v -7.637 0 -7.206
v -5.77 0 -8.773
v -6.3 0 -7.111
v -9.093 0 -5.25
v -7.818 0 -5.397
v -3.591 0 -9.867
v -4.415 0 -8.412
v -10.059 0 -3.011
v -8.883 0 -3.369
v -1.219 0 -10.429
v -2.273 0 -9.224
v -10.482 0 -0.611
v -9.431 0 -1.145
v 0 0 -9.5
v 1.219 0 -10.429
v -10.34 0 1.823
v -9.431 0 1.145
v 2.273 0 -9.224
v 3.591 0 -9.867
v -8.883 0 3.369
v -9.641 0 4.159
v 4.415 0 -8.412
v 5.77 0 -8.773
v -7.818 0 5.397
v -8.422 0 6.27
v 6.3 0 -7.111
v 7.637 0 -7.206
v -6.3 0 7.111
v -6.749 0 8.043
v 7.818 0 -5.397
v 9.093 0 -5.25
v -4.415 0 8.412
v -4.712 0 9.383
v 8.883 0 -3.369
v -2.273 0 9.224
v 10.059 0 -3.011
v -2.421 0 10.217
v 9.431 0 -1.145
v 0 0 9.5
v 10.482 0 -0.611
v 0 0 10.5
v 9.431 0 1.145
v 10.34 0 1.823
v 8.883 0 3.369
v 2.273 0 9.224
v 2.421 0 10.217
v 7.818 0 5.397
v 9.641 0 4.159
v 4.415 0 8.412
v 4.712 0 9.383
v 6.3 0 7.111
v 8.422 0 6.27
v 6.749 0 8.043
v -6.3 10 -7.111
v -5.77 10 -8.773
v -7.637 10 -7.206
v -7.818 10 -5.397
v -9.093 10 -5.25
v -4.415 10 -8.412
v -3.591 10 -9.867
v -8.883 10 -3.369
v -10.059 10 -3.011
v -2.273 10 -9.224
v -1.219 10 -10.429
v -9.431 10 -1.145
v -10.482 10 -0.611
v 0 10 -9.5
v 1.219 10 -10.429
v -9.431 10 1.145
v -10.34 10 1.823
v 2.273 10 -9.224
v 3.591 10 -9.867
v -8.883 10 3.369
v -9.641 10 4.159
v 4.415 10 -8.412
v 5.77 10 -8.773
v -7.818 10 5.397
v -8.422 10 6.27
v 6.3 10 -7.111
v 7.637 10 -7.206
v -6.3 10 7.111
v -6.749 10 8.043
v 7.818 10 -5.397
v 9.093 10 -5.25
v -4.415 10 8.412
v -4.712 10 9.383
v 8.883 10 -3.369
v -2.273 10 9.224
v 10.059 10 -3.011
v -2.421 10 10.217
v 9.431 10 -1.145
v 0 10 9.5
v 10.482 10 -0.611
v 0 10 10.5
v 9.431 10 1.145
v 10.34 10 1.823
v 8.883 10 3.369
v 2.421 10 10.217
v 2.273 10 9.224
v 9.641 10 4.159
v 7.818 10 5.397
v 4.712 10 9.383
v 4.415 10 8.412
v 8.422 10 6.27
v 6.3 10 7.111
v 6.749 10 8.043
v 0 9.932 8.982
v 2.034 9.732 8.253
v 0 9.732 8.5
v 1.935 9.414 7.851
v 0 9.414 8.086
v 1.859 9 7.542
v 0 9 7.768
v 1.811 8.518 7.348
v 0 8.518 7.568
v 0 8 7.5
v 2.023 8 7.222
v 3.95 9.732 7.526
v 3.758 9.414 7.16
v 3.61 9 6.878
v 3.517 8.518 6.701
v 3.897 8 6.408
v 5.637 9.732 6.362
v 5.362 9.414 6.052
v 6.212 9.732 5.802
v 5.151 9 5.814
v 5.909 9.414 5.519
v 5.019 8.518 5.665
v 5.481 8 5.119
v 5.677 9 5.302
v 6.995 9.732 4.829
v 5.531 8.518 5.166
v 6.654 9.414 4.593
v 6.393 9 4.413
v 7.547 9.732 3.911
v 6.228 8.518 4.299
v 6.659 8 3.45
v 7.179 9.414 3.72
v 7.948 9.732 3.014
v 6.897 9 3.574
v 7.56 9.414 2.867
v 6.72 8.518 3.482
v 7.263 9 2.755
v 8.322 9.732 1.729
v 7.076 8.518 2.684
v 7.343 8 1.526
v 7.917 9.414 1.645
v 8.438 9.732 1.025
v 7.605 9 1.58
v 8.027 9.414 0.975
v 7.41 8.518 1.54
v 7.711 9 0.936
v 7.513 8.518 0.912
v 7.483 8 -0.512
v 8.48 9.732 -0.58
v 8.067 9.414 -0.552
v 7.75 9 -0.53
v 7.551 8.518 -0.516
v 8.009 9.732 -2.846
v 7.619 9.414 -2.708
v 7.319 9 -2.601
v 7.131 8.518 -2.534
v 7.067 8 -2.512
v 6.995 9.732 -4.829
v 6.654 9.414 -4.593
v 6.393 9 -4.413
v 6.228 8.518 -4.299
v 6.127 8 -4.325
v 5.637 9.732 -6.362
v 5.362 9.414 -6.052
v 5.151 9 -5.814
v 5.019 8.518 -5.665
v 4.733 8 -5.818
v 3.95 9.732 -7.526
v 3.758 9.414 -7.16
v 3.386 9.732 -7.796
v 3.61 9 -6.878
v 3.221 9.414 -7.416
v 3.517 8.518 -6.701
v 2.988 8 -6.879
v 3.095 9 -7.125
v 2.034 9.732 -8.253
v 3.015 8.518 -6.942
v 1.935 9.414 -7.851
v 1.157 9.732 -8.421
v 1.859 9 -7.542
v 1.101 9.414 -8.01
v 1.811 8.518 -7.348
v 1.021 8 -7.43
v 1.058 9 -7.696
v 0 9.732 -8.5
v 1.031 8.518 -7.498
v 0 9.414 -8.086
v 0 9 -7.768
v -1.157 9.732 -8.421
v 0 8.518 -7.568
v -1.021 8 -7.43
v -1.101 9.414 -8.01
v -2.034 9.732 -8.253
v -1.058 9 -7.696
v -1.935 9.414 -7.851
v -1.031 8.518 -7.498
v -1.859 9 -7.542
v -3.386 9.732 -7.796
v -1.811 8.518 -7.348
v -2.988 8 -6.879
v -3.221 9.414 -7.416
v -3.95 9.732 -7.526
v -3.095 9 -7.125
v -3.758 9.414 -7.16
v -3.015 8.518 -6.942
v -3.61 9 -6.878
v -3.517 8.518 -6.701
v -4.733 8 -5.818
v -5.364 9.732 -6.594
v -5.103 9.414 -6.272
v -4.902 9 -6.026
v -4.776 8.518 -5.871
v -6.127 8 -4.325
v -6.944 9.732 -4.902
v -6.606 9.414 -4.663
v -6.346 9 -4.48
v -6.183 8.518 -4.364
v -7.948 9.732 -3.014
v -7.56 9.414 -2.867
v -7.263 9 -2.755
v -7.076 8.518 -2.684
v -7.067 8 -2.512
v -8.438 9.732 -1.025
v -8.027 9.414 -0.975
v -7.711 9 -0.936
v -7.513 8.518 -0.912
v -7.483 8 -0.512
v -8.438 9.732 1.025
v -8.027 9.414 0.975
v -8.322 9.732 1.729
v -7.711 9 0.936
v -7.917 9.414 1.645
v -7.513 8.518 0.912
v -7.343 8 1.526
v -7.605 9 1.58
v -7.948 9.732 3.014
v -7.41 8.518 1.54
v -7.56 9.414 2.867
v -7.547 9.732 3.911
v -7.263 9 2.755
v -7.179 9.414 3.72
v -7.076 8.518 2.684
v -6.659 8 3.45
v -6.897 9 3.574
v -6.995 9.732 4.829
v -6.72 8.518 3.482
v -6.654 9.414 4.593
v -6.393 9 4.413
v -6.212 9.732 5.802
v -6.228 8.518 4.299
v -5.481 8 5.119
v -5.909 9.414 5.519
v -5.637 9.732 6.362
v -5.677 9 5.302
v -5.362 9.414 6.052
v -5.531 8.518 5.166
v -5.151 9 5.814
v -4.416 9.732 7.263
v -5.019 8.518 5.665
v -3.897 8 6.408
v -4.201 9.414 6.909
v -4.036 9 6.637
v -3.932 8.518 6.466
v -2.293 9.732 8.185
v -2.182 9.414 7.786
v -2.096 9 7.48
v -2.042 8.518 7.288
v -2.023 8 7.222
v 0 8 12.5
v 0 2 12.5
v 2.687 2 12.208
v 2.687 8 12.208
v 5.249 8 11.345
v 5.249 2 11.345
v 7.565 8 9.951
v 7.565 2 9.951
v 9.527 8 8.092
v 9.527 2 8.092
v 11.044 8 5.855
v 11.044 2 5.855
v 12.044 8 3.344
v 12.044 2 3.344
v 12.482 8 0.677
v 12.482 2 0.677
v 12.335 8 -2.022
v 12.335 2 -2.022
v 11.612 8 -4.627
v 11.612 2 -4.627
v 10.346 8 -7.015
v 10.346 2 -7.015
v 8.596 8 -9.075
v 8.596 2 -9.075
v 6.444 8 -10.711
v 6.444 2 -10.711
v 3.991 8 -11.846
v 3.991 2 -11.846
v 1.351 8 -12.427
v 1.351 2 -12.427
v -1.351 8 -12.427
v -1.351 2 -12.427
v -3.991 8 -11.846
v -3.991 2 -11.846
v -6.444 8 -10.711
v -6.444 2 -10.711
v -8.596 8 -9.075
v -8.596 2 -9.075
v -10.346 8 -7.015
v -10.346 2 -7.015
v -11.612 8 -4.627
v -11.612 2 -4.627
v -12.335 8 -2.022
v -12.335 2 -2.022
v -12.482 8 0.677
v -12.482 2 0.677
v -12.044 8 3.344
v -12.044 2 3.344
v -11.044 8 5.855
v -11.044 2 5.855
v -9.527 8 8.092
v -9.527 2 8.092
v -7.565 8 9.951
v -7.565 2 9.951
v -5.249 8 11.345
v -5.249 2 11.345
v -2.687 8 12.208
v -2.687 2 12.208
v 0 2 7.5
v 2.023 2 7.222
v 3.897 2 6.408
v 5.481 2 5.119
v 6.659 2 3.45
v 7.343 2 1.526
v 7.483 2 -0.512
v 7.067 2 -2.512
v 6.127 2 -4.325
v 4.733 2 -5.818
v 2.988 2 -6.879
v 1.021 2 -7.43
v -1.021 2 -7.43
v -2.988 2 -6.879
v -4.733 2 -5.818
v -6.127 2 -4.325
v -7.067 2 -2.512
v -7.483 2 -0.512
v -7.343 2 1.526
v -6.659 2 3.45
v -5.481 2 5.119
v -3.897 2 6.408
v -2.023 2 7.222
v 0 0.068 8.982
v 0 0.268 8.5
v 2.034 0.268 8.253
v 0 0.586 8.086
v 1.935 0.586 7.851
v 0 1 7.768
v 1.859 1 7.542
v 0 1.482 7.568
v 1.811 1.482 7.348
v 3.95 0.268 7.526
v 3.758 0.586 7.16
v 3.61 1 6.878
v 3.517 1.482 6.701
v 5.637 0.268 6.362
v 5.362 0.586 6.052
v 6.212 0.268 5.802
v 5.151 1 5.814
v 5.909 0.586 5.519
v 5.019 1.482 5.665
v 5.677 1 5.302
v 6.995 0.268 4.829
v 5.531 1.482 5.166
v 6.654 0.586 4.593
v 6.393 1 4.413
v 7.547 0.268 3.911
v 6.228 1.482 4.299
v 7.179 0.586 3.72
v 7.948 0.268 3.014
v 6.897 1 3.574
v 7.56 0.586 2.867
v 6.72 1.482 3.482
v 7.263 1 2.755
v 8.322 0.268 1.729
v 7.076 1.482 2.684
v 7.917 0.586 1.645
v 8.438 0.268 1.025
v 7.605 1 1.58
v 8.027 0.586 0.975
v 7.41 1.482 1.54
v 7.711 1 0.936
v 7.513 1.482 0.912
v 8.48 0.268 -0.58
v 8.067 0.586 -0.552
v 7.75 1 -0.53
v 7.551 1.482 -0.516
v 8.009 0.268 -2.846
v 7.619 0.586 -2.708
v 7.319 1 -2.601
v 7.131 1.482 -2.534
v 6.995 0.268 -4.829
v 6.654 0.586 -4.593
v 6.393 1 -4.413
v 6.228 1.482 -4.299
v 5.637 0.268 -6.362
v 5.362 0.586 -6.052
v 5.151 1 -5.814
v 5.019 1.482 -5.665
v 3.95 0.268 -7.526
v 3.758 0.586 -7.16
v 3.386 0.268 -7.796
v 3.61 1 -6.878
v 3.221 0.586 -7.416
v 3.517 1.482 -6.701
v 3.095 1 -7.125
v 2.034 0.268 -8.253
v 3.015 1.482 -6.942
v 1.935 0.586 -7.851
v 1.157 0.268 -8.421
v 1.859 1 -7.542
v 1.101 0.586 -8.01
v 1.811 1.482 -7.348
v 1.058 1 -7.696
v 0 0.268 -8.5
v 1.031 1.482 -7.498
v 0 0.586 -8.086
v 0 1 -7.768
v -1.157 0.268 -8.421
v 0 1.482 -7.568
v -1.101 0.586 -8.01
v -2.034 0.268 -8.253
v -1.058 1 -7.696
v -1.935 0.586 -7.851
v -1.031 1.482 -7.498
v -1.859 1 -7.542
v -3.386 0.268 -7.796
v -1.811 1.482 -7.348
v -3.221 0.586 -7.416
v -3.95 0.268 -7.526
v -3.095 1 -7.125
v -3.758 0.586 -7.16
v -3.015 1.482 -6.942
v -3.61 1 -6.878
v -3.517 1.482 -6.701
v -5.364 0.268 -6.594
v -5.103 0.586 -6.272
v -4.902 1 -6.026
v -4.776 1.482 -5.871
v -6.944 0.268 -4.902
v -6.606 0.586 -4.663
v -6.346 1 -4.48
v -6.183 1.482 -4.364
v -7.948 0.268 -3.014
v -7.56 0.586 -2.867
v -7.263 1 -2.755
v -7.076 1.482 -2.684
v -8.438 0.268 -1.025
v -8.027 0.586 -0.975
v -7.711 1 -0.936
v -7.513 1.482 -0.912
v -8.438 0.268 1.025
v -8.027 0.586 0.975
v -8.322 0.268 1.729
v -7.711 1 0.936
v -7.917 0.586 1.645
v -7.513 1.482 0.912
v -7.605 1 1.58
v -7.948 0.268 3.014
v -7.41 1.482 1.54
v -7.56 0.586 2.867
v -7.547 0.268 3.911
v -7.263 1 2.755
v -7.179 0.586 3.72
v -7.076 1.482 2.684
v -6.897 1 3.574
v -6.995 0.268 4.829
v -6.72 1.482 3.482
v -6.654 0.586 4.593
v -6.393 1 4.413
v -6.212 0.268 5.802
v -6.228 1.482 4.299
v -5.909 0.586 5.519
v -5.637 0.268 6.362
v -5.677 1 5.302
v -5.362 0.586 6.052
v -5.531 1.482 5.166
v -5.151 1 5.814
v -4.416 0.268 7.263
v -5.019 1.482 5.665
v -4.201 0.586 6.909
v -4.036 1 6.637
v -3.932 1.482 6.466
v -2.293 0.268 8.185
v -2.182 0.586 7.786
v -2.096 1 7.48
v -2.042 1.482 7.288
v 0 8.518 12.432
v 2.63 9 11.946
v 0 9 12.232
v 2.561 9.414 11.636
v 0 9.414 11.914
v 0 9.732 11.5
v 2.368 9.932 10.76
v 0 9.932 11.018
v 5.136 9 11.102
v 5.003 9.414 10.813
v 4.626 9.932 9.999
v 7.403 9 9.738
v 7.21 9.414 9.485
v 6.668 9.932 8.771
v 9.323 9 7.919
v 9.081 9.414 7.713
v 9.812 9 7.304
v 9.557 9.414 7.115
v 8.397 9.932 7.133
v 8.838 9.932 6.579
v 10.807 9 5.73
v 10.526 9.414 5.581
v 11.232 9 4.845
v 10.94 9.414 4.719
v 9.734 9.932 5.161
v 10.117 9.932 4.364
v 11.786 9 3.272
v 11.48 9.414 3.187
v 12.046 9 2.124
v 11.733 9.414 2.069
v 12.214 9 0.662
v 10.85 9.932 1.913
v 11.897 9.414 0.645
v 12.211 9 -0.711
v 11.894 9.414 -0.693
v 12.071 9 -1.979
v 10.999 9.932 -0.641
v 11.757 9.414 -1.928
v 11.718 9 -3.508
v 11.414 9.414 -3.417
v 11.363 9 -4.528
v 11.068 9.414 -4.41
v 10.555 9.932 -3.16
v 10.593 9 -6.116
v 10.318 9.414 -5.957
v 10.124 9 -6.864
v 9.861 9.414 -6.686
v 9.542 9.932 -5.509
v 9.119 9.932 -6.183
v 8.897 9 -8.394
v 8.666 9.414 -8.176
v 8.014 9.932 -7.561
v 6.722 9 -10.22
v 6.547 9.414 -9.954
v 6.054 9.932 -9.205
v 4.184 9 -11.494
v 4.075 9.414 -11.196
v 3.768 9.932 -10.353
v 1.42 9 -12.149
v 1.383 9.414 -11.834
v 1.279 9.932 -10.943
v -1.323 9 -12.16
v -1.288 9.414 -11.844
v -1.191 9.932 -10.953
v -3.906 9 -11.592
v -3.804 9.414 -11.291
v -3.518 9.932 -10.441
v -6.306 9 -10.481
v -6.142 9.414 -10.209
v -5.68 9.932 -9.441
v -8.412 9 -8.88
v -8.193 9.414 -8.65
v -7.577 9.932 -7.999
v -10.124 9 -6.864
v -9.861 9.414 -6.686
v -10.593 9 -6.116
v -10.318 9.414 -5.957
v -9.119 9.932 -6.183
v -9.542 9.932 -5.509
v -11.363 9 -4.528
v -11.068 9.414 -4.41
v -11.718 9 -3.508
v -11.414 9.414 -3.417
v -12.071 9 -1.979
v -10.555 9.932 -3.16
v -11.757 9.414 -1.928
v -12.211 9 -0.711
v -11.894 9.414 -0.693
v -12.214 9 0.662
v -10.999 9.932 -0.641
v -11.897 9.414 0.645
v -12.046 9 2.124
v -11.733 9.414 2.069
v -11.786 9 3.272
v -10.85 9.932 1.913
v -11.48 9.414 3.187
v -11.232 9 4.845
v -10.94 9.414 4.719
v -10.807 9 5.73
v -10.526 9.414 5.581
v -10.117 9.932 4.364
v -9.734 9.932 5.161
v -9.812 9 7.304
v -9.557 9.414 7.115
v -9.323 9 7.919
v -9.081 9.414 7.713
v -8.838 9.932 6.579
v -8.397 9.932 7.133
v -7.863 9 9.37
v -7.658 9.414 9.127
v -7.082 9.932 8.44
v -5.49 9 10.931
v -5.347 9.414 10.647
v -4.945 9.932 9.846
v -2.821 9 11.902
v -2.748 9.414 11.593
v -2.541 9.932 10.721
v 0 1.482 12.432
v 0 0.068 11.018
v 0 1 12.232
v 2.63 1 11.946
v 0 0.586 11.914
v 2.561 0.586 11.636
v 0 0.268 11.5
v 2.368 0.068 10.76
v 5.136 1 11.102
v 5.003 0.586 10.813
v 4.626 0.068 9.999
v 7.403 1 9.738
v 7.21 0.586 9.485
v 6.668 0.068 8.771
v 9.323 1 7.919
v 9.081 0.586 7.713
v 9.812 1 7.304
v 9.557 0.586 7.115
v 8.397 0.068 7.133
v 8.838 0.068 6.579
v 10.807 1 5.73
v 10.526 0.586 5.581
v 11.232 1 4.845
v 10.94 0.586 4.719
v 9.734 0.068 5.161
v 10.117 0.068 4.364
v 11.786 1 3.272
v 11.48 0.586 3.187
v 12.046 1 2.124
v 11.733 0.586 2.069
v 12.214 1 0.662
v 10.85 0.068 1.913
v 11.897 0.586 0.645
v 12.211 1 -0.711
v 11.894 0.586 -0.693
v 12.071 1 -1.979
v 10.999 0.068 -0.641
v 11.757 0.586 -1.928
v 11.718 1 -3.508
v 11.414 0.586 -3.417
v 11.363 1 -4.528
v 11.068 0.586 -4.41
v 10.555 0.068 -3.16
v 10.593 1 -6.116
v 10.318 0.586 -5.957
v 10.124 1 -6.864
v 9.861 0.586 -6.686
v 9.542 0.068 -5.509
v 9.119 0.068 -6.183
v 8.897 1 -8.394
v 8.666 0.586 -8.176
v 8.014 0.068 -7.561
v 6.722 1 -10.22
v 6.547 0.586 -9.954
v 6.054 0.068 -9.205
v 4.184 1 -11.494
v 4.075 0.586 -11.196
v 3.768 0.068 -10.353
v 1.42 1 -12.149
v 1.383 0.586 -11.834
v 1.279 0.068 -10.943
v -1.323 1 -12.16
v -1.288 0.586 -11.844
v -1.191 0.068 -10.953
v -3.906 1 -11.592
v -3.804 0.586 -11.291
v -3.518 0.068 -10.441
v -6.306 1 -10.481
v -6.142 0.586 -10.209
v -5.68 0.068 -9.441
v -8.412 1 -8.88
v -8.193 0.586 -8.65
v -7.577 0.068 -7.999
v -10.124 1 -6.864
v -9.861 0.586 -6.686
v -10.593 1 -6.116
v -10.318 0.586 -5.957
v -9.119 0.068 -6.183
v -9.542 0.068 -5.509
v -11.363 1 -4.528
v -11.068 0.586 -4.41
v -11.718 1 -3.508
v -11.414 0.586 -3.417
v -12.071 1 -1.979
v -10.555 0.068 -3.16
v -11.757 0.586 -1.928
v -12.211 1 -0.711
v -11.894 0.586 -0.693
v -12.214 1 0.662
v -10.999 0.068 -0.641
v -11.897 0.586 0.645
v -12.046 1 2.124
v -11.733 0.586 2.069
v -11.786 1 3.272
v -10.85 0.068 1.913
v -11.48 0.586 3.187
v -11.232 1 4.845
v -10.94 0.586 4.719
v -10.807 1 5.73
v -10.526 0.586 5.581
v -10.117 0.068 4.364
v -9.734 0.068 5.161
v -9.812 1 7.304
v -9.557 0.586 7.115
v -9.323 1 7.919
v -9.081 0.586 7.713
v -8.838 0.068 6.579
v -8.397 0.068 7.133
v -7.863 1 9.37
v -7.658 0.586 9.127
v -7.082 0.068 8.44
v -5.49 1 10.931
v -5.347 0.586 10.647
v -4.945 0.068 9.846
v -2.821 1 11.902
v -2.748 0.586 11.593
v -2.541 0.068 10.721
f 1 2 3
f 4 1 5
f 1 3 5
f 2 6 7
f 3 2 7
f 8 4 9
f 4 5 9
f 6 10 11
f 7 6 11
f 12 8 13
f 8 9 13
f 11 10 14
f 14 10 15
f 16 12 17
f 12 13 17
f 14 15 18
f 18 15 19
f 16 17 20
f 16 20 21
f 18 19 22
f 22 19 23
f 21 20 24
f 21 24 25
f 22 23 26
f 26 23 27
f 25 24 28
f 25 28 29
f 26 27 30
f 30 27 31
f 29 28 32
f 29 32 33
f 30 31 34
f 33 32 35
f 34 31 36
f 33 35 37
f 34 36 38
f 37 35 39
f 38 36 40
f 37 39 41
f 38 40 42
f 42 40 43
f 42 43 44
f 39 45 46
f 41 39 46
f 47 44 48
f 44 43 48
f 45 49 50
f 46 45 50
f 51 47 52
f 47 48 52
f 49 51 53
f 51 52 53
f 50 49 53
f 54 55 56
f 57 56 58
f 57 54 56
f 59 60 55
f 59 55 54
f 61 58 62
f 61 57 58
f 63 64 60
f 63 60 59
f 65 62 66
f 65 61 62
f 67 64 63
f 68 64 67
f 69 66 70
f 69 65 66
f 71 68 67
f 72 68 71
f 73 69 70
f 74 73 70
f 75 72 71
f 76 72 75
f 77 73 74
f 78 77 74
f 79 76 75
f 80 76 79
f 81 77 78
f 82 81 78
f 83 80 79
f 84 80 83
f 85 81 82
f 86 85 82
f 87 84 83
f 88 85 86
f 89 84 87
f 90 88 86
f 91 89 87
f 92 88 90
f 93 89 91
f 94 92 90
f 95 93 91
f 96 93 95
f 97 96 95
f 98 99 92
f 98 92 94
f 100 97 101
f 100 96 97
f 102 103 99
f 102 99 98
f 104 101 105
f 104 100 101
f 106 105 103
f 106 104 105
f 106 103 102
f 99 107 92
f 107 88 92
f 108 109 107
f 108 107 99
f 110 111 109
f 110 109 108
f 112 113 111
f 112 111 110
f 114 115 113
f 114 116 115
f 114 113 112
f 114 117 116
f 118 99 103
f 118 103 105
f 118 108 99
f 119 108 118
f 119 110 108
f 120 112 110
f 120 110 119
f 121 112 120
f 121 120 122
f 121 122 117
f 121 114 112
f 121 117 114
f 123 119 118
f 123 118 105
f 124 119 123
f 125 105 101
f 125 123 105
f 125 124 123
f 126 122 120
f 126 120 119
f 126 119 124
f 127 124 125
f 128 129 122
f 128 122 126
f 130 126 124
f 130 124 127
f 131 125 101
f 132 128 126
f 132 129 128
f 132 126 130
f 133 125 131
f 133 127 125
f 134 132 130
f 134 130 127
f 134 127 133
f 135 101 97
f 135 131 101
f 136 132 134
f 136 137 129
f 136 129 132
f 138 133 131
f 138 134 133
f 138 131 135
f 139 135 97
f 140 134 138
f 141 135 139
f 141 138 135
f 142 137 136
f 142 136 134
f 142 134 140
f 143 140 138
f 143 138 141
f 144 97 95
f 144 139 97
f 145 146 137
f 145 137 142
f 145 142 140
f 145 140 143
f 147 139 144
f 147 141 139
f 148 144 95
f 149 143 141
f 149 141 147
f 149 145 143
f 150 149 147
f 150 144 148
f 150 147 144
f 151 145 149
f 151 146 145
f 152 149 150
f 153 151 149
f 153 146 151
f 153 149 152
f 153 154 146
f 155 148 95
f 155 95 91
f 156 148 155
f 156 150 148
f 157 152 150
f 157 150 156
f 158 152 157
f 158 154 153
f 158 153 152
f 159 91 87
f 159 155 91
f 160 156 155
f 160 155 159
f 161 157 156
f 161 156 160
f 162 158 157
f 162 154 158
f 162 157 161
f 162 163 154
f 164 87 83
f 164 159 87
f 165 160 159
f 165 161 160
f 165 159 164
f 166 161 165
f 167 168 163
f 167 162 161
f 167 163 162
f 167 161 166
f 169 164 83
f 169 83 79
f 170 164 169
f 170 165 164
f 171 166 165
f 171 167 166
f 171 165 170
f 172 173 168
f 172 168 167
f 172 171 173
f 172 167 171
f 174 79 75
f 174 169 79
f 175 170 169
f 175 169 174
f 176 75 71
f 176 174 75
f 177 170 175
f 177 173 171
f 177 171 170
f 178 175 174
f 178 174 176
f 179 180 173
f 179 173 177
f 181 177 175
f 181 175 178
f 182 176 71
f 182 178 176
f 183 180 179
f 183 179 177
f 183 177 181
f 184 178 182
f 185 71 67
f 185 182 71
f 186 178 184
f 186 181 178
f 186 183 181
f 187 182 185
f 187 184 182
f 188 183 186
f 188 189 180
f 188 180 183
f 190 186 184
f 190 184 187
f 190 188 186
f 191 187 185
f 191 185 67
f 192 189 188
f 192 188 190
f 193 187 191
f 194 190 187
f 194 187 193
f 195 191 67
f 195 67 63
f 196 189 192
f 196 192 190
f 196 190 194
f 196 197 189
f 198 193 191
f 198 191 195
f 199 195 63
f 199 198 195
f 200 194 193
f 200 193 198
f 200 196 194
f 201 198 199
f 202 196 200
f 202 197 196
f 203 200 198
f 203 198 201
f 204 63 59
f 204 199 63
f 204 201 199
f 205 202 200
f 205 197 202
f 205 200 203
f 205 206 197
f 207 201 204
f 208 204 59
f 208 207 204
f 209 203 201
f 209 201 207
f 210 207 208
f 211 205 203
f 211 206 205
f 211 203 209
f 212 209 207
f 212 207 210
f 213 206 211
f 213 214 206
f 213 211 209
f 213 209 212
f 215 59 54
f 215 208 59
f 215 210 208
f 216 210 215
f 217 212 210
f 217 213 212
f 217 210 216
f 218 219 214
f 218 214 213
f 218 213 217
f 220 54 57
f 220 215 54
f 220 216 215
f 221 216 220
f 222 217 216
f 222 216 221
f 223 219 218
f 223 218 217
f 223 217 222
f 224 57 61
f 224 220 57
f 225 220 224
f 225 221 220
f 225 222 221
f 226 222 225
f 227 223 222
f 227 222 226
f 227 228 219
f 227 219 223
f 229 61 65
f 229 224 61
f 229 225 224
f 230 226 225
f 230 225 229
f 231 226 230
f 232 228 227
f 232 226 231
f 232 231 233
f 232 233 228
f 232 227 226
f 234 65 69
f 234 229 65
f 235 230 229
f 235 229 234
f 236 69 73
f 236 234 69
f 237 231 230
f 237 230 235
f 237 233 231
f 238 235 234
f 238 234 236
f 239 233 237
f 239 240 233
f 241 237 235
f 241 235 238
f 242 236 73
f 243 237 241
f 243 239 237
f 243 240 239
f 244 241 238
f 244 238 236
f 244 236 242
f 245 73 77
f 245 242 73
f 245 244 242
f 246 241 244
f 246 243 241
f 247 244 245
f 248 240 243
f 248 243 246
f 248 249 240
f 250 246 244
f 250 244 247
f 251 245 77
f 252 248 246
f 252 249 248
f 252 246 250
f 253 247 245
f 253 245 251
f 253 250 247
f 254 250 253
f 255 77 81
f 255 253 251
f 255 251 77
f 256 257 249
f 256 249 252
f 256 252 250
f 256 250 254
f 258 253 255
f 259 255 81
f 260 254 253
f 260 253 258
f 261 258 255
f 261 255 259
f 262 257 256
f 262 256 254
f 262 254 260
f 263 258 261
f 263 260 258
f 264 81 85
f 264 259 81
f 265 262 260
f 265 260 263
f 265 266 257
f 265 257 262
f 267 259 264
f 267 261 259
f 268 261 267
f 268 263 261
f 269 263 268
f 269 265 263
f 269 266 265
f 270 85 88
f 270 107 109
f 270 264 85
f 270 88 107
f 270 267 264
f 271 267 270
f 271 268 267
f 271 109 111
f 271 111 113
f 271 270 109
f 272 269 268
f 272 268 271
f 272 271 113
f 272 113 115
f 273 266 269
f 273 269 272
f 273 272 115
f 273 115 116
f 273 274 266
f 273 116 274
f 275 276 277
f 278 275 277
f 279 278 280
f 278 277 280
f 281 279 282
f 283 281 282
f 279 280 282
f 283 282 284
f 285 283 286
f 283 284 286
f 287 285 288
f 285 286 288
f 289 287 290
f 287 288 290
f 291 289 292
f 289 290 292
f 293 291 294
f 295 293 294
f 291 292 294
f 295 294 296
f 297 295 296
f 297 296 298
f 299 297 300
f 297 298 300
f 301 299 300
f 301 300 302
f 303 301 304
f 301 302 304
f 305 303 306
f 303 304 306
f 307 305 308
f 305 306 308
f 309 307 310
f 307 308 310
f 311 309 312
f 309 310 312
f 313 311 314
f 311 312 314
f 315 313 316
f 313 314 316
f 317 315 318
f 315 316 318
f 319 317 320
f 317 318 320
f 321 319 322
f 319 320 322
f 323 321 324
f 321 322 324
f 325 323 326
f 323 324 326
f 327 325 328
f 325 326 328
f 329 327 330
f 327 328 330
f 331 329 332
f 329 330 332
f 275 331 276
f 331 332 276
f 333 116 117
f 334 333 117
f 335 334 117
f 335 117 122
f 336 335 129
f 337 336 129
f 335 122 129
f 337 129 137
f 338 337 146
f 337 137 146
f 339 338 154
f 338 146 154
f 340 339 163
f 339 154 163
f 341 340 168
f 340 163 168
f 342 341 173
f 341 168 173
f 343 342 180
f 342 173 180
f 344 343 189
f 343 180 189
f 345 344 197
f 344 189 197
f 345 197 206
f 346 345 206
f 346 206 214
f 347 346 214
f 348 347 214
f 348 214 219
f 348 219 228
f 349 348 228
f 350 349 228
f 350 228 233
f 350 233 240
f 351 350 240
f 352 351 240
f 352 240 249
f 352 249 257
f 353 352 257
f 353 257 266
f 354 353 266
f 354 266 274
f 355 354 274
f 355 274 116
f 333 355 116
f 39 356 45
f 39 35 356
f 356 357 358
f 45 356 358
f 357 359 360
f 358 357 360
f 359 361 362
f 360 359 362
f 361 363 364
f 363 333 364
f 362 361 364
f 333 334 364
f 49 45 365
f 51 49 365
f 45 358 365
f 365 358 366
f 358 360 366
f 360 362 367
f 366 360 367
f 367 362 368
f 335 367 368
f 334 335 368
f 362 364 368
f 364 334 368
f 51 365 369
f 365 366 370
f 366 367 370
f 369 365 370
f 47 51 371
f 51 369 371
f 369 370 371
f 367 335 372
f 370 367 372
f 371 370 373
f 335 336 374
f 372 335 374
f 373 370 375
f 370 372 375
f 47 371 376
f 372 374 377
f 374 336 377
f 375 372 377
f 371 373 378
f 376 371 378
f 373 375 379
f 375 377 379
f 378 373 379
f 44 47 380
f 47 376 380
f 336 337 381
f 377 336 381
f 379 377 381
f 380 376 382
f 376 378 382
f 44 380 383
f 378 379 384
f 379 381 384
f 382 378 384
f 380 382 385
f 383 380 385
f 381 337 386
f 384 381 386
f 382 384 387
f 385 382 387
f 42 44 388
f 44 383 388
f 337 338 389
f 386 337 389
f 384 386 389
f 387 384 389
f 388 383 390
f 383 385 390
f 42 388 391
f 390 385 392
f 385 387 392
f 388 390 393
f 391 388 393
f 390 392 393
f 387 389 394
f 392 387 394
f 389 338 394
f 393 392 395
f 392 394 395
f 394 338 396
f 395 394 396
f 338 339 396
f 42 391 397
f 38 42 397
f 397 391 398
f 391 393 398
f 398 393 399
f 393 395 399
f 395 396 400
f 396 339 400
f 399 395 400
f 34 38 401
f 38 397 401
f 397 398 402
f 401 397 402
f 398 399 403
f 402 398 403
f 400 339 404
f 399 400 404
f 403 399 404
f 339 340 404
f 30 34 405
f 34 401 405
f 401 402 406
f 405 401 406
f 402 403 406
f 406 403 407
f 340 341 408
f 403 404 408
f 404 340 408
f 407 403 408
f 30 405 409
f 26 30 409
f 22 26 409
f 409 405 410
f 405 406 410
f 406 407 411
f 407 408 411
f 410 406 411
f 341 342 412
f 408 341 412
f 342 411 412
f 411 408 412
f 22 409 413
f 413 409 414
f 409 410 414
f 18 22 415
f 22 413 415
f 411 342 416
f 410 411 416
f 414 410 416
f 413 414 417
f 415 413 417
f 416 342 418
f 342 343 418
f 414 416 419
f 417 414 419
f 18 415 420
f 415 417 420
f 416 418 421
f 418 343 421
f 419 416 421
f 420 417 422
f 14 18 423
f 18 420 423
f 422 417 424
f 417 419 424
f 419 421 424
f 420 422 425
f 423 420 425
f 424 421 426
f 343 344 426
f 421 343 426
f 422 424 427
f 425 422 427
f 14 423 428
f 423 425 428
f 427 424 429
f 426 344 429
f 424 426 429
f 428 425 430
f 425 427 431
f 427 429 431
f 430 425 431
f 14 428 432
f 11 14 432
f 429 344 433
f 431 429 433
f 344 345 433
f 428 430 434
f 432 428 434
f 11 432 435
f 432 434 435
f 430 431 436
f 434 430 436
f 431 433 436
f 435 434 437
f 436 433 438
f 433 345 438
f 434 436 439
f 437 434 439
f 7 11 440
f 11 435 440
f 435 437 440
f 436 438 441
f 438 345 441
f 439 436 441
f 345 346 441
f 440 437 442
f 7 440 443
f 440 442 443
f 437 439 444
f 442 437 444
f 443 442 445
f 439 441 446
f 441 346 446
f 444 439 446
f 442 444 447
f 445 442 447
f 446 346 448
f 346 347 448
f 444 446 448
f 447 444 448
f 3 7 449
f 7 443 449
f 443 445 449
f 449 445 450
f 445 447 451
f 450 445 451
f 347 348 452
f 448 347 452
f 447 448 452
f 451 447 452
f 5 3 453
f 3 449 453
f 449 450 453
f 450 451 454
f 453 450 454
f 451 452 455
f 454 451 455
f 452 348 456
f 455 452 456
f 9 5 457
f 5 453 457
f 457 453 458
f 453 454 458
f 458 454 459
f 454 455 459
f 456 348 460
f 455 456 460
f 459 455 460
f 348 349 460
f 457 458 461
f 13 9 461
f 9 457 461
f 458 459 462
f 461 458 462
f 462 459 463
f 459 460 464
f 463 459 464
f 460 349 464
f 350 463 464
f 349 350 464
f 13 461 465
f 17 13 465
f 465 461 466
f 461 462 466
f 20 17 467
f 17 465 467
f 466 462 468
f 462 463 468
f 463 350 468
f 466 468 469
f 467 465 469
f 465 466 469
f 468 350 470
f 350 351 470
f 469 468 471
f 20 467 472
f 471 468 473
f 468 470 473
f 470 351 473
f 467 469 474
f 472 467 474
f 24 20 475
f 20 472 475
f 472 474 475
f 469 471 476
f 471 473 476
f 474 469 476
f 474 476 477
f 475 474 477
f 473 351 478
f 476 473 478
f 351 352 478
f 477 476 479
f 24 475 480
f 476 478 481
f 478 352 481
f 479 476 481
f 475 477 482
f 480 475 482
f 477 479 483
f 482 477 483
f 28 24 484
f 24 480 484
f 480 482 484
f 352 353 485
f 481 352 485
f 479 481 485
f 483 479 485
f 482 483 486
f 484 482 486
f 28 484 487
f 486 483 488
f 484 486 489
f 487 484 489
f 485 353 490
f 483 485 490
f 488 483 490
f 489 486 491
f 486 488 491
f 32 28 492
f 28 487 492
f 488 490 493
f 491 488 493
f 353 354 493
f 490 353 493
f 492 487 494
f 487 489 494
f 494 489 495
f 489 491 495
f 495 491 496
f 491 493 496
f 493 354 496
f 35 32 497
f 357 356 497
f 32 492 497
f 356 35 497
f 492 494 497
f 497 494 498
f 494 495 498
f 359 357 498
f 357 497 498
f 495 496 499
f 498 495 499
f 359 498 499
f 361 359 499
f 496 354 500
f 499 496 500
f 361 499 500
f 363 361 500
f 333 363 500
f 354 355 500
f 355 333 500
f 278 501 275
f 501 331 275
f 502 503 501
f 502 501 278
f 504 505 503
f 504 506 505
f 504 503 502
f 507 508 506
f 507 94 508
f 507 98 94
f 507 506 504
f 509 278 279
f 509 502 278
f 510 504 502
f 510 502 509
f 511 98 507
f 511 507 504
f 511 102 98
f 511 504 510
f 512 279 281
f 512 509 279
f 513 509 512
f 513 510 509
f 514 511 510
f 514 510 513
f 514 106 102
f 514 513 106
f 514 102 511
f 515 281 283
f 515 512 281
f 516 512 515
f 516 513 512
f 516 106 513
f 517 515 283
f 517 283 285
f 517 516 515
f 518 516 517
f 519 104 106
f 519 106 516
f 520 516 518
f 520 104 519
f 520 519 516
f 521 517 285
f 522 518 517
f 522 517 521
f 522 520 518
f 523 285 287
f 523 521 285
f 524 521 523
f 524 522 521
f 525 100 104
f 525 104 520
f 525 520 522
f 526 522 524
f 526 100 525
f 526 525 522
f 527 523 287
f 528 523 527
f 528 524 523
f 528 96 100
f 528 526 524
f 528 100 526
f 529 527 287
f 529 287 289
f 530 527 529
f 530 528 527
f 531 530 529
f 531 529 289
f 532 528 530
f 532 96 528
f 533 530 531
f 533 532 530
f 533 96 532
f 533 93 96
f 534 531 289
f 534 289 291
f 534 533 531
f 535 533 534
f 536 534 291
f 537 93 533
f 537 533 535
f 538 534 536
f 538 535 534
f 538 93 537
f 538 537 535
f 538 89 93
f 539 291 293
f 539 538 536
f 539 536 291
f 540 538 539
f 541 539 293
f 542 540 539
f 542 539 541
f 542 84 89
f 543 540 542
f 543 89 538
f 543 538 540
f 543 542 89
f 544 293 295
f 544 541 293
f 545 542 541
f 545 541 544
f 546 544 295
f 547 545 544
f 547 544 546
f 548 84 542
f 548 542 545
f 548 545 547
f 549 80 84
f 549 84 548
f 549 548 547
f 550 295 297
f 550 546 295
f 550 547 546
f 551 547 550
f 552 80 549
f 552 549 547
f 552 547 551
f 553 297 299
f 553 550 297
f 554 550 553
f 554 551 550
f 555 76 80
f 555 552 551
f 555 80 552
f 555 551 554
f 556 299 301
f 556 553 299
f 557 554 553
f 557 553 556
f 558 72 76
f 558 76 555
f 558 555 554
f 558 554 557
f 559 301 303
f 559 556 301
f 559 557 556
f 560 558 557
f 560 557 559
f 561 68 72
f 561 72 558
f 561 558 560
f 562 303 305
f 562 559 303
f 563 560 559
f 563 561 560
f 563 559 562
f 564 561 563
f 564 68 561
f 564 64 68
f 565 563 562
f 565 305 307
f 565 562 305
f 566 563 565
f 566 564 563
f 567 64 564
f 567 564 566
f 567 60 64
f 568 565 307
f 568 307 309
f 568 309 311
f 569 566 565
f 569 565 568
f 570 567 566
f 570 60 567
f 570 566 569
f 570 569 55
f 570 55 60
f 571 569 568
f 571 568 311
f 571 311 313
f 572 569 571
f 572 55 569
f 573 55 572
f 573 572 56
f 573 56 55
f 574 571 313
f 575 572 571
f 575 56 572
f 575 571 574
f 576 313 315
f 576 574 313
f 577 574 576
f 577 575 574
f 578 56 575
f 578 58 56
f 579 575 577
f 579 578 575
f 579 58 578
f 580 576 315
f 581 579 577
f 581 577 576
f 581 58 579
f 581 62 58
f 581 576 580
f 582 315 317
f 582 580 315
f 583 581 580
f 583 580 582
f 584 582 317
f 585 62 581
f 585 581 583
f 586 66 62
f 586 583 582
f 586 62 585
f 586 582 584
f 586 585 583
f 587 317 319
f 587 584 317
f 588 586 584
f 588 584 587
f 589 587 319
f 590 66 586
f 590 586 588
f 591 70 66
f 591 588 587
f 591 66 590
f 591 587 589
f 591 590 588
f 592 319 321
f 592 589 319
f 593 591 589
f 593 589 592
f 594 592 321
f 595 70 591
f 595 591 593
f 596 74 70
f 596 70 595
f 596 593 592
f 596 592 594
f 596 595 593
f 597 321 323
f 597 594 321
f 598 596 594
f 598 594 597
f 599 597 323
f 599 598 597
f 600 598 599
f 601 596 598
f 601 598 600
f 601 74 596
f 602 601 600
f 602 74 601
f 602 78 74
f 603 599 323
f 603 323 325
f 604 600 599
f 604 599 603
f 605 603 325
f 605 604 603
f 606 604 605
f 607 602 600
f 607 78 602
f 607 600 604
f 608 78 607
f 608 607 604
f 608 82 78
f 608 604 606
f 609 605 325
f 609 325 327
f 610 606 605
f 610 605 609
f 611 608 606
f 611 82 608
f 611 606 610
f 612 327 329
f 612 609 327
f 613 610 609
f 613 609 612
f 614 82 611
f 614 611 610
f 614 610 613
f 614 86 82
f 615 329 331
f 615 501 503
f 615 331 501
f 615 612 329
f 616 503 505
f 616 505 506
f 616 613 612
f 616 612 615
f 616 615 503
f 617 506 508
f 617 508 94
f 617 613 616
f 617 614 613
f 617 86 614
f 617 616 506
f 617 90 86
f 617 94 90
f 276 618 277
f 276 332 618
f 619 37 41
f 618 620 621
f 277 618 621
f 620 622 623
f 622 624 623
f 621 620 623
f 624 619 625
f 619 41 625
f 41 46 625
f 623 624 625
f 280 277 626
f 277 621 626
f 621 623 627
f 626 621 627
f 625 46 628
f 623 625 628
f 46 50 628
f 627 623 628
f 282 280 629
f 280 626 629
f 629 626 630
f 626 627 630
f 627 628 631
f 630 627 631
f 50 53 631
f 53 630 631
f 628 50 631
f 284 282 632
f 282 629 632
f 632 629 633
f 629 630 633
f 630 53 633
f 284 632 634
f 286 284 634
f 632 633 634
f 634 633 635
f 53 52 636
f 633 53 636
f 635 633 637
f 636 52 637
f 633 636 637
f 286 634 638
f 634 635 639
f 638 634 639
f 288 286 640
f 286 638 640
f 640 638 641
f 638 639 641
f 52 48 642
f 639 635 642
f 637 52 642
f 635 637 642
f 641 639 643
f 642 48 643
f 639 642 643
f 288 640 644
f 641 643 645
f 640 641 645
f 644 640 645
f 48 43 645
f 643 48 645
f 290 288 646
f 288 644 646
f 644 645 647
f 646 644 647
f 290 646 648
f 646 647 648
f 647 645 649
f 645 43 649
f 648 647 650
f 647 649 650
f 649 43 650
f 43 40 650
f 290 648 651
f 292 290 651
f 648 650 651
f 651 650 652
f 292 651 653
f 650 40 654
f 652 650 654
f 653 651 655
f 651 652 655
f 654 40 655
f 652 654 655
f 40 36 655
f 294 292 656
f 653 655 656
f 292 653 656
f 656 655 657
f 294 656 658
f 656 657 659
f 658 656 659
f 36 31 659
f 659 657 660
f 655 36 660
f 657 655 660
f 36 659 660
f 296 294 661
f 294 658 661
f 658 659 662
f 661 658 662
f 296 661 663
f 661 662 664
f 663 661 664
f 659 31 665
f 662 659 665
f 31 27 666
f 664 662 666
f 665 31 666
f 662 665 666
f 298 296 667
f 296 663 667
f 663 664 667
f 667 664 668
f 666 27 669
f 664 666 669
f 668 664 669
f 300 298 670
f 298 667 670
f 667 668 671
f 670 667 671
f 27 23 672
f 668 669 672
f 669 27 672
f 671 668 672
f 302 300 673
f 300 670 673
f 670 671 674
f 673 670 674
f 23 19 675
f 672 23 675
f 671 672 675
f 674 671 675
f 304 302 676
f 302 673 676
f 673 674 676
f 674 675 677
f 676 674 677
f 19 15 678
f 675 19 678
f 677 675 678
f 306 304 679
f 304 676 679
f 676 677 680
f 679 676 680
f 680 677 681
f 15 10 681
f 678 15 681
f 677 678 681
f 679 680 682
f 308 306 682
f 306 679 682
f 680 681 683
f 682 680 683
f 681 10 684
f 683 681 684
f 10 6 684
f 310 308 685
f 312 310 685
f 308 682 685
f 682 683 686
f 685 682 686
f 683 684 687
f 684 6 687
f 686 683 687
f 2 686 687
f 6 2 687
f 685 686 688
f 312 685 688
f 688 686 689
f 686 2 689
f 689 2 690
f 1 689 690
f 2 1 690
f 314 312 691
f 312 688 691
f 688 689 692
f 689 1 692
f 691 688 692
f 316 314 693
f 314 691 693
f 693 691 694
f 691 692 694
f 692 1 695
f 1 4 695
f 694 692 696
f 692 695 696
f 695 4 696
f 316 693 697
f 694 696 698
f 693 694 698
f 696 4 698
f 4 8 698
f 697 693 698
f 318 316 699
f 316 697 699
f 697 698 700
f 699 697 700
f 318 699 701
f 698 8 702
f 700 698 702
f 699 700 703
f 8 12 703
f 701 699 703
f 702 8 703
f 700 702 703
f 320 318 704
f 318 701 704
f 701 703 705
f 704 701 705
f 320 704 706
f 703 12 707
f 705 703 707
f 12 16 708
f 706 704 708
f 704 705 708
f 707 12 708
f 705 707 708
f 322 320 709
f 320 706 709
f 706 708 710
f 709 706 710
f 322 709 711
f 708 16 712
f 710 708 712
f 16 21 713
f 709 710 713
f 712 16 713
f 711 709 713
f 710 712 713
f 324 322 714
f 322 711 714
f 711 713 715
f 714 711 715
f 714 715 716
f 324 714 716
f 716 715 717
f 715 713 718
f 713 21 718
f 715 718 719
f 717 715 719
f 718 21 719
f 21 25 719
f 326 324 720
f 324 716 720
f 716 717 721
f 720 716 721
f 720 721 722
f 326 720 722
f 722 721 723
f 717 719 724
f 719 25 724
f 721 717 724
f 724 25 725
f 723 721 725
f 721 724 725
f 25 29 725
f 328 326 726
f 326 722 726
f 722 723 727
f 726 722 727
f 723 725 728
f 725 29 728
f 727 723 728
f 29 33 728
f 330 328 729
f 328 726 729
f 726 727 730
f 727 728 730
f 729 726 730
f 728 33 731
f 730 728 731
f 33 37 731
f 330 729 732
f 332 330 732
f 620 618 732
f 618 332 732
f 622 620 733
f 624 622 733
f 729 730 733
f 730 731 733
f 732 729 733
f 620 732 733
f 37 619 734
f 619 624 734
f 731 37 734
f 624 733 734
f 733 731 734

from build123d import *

# Parameters (mm, degrees)
SKETCH1_R           = 12.5
BOSS_EXTRUDE1_DEPTH = 10
SKETCH2_R           = 7.5
CUT_EXTRUDE1_DEPTH  = 21.310096012
FILLET1_R           = 2


with BuildPart() as part:
    # Sketch1 → Boss-Extrude1 (new body)
    with BuildSketch(Plane(origin=(0, 0, 0), x_dir=(1, 0, 0), z_dir=(0, 1, 0))):
        with Locations(Location((0, 0, 0), (0, 0, 270))):
            Circle(SKETCH1_R)
    extrude(amount=BOSS_EXTRUDE1_DEPTH)

    # Sketch2 → Cut-Extrude1 (cut, through all)
    with BuildSketch(Plane(origin=(0, 10, 0), x_dir=(1, 0, 0), z_dir=(0, 1, 0))):
        with Locations(Location((0, 0, 0), (0, 0, 270))):
            Circle(SKETCH2_R)
    extrude(amount=-CUT_EXTRUDE1_DEPTH, mode=Mode.SUBTRACT)

    # Fillet1
    fillet1_edges = [part.edges().sort_by_distance(p)[0] for p in [
        (0, 0, -12.5),
        (0, 10, -12.5),
        (0, 0, -7.5),
        (0, 10, -7.5),
    ]]
    fillet(fillet1_edges, radius=FILLET1_R)


solid = part.part
